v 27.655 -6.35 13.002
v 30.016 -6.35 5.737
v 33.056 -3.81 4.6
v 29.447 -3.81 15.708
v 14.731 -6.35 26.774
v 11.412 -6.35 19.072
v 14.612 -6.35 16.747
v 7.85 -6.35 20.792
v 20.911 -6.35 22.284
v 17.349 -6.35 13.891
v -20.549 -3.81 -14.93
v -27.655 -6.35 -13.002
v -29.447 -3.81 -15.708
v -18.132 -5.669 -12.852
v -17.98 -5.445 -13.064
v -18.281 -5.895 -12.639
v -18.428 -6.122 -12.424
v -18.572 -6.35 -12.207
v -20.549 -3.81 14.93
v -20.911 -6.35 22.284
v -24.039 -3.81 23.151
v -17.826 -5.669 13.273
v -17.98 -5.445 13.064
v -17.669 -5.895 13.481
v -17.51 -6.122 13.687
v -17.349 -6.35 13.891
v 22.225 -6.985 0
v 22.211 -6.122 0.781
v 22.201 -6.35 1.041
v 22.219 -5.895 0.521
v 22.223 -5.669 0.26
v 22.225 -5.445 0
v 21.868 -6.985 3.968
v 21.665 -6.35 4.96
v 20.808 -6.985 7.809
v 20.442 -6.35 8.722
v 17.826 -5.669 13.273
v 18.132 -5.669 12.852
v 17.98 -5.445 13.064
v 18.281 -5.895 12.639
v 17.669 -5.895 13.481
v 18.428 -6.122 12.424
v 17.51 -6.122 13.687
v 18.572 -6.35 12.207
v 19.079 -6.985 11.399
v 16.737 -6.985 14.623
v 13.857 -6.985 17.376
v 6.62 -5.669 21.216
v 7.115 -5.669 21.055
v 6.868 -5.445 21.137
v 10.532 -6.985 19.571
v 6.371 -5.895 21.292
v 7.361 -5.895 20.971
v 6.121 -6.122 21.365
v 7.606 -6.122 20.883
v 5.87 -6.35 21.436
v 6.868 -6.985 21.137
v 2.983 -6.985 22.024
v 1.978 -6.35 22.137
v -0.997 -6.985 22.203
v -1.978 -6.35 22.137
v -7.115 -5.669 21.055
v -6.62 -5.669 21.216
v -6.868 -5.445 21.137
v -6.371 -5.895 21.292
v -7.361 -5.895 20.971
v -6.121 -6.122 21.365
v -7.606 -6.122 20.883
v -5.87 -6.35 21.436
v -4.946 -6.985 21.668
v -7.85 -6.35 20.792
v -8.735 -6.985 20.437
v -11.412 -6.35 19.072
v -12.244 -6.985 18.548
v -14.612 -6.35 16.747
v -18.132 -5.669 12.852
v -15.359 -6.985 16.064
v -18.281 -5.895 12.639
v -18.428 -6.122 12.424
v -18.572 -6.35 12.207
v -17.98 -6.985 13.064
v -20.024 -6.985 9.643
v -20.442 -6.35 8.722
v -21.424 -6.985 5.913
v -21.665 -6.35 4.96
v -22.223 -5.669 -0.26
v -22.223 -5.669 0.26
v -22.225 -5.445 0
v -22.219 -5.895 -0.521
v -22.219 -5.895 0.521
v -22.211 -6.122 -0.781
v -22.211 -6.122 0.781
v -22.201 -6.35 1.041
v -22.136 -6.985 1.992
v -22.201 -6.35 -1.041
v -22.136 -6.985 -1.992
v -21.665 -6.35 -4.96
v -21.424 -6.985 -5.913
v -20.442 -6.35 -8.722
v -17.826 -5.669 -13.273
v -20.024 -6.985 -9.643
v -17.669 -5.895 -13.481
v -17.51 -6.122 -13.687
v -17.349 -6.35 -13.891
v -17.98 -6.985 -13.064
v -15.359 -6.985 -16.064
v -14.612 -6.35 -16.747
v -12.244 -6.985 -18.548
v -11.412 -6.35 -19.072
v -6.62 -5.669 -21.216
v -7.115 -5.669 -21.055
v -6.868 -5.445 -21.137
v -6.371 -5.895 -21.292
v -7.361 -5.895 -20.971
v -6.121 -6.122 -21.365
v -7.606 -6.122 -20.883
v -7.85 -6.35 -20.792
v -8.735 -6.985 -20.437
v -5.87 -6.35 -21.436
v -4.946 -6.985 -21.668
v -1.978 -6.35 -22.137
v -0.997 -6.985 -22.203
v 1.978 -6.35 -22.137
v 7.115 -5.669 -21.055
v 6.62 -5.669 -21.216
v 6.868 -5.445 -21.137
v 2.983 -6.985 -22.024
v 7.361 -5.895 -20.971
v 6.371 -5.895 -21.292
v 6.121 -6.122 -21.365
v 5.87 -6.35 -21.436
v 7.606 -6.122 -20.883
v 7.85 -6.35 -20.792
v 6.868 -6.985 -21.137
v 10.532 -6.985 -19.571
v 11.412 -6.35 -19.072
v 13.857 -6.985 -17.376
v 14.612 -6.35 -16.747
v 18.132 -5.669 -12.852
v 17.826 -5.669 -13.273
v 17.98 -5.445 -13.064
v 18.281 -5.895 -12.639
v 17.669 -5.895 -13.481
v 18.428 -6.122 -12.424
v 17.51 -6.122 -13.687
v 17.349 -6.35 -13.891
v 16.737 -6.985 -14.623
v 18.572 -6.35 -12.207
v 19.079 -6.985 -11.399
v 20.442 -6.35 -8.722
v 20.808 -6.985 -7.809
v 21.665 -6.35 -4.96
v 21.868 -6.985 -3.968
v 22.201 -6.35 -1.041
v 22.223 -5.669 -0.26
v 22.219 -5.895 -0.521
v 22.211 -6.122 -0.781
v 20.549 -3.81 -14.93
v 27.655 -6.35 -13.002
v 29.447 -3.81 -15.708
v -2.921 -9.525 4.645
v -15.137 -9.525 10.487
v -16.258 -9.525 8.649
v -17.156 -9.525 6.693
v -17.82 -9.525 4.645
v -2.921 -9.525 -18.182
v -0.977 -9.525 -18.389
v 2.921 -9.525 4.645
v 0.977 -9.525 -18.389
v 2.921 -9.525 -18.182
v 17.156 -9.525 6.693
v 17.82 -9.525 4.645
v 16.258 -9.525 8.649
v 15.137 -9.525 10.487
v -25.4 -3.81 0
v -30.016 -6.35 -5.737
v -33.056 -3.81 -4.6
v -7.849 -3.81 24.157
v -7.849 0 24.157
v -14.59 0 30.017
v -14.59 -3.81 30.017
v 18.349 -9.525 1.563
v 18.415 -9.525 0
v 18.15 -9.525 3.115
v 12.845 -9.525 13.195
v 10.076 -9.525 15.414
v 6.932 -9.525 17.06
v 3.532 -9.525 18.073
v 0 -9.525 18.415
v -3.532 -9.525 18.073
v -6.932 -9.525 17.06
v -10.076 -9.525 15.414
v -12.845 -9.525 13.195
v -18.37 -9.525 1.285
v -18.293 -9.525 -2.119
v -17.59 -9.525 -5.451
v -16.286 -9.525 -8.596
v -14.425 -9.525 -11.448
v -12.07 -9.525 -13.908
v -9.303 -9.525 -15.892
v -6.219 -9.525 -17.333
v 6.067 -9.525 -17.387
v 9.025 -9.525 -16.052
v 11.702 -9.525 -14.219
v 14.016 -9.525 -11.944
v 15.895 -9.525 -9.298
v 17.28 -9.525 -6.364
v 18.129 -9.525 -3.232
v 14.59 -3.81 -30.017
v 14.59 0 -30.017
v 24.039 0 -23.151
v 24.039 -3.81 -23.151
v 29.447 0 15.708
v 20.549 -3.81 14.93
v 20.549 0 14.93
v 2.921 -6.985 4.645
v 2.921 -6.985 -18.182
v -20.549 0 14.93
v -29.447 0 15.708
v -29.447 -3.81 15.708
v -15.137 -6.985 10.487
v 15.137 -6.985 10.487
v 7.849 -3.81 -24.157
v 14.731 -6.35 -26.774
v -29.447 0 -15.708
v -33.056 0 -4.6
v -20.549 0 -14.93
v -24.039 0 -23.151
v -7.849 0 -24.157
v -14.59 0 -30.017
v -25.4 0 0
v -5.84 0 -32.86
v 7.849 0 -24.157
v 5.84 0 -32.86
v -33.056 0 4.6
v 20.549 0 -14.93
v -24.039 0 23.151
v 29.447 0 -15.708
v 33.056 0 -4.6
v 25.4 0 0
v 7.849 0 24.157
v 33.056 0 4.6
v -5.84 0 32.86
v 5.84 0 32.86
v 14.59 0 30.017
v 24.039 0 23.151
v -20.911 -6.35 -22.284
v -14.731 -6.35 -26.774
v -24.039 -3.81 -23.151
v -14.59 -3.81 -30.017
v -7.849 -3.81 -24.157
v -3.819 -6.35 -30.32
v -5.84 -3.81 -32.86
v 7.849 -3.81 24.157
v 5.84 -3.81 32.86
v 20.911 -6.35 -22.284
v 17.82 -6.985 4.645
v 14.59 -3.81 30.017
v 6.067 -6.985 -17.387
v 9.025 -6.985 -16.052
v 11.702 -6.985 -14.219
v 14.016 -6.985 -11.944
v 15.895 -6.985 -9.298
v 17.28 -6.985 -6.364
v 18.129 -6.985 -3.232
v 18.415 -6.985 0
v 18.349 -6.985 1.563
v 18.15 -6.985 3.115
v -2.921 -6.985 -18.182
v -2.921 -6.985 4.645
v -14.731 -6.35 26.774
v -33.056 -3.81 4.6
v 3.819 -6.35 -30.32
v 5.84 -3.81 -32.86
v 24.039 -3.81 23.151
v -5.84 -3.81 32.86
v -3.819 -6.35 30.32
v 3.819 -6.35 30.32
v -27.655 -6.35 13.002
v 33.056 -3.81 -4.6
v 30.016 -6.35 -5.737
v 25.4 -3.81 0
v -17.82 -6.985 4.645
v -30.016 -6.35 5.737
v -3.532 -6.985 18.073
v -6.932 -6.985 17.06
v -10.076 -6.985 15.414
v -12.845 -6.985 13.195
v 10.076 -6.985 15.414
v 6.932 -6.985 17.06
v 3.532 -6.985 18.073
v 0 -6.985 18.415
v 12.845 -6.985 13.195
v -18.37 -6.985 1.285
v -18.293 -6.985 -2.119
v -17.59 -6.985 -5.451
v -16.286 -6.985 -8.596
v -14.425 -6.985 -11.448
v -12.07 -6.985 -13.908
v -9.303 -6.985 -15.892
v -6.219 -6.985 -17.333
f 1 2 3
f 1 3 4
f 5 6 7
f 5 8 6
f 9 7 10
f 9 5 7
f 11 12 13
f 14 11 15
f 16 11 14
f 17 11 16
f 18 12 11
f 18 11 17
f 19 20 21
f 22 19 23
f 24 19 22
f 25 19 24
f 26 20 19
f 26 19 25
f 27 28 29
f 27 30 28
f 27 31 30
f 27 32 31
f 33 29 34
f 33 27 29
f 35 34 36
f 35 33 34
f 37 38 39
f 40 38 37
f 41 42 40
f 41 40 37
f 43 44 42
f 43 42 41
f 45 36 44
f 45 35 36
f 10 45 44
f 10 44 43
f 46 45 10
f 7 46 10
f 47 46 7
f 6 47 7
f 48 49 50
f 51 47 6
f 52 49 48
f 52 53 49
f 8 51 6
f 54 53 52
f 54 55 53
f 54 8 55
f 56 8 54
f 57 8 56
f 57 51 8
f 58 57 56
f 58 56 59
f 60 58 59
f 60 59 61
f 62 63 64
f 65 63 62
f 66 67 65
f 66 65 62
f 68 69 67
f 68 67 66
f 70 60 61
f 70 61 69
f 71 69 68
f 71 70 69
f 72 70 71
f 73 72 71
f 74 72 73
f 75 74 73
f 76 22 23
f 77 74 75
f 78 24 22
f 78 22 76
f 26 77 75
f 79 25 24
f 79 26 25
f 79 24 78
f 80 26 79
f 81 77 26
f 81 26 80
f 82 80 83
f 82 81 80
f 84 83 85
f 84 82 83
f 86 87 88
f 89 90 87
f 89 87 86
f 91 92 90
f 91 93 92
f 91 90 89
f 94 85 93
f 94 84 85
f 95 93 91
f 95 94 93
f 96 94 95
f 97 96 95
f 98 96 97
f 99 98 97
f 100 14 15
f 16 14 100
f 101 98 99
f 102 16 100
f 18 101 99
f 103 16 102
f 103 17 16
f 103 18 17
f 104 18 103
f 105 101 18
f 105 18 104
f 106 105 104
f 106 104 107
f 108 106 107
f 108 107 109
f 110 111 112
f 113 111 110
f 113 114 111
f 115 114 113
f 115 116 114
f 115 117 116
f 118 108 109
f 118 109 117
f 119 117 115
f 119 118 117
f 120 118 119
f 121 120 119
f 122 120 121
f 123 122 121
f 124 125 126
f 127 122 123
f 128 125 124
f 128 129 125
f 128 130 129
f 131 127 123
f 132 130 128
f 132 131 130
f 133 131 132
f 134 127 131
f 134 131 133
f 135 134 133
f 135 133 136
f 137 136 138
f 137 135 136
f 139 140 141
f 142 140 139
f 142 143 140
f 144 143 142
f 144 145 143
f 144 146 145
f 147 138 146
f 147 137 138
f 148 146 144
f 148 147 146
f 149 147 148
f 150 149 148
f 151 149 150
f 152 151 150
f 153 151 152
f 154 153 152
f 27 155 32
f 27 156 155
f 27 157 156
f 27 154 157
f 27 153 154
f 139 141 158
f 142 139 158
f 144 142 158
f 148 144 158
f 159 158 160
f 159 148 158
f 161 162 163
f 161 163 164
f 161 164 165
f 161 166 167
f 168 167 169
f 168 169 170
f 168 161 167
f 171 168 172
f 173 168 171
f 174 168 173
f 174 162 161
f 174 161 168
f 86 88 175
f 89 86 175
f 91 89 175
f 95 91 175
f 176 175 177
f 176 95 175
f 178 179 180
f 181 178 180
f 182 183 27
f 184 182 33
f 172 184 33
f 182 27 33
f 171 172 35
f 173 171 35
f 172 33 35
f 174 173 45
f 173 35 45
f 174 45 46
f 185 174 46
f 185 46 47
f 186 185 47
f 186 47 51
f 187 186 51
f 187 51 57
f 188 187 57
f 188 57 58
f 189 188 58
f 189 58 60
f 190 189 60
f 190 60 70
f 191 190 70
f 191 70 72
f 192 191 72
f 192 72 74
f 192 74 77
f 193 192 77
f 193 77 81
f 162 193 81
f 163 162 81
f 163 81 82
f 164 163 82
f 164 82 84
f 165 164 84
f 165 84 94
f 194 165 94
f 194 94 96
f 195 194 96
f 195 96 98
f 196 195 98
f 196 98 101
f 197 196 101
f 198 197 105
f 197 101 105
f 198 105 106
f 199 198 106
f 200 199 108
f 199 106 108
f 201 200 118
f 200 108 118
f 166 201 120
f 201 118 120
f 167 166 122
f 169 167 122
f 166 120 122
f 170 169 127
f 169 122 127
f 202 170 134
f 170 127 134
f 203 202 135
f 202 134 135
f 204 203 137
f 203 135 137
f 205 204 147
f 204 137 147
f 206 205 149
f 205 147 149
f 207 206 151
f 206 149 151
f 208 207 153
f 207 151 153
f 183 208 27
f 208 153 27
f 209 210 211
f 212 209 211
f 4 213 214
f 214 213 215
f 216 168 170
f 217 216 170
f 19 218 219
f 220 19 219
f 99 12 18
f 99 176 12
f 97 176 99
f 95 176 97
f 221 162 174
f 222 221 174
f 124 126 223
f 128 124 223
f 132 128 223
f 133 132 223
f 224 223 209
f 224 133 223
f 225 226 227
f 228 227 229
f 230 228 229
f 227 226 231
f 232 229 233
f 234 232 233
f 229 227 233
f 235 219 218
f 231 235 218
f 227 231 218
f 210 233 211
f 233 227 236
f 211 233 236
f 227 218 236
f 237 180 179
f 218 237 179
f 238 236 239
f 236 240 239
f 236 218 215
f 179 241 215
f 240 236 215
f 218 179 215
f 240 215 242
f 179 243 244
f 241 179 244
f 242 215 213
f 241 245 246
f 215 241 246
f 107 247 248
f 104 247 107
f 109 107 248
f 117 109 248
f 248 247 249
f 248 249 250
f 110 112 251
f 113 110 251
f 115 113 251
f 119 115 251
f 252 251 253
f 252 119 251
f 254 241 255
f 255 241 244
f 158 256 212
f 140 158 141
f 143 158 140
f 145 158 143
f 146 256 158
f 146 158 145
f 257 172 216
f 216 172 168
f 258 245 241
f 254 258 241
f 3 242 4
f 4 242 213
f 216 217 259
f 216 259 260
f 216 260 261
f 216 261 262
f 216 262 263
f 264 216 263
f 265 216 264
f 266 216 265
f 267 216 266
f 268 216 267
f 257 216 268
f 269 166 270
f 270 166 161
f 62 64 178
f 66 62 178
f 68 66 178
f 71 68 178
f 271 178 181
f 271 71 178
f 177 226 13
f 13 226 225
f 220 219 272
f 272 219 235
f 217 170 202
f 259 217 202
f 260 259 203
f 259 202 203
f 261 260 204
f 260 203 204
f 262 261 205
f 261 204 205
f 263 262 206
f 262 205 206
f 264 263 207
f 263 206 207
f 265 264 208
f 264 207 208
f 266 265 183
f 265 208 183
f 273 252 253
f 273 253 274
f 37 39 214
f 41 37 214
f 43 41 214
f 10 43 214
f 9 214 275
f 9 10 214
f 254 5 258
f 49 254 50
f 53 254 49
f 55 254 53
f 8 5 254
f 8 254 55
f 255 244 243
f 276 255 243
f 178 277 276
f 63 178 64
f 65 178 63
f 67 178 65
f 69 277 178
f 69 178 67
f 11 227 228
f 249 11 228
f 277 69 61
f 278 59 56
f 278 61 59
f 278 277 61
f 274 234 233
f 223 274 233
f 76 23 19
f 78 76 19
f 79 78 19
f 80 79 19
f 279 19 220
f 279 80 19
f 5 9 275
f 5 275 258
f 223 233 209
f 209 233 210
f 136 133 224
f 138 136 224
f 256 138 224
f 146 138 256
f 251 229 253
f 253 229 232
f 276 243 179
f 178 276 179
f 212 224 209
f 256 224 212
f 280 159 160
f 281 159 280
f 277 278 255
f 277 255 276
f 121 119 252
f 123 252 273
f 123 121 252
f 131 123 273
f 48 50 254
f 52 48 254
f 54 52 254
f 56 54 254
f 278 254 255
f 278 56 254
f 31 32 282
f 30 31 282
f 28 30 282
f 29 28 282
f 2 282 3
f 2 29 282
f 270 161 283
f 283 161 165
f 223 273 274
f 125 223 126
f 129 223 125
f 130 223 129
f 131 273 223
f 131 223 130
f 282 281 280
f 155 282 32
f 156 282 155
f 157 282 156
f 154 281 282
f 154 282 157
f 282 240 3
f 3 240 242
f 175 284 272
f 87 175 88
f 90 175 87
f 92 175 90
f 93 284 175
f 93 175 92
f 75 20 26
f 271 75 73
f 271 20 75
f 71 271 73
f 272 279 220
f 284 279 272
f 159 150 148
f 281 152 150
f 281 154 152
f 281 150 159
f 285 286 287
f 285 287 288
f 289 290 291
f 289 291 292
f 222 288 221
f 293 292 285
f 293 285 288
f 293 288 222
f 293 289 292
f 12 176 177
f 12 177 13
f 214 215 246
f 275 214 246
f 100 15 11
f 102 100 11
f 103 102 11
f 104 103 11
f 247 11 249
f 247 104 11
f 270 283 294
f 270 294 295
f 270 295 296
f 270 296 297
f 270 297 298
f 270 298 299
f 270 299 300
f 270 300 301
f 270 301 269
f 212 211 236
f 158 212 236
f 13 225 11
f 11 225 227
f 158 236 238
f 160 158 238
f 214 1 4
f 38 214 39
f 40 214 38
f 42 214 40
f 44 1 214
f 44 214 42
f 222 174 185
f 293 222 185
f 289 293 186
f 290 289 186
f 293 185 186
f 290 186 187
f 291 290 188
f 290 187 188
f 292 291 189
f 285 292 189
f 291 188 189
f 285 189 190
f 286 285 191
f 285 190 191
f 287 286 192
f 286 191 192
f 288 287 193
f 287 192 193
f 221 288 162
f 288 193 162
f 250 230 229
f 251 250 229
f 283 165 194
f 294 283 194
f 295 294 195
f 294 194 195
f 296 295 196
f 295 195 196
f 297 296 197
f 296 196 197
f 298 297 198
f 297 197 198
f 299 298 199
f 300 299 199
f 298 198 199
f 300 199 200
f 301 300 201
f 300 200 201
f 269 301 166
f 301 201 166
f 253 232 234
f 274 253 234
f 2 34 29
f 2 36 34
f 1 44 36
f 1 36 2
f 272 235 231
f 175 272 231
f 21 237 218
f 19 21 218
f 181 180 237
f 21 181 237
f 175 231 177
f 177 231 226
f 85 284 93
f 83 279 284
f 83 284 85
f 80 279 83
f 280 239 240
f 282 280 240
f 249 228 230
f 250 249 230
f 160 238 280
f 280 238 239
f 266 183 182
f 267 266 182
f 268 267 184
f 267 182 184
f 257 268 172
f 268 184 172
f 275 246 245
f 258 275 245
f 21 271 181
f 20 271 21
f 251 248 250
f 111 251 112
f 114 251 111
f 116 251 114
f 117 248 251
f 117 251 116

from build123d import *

# Parameters (mm, degrees)
F1_DEPTH = 6.35
F2_SIZE  = 2.54
F3_R     = 22.225
F4_DEPTH = 3.175
F5_SIZE2 = 2.54
F5_SIZE  = 3.81
F7_DEPTH = 2.54


with BuildPart() as f1:
    # F0 (on Front) → F1 (new body)
    with BuildSketch(Plane.XZ):
        with BuildLine():
            ThreePointArc((20.5490316571, -14.9297454082), (24.1568355139, -7.8490316571), (25.4, 0))
            ThreePointArc((25.4, 0), (24.1568355139, 7.8490316571), (20.5490316571, 14.9297454082))
            ThreePointArc((20.5490316571, 14.9297454082), (14.9297454082, 20.5490316571), (7.8490316571, 24.1568355139))
            ThreePointArc((7.8490316571, 24.1568355139), (0, 25.4), (-7.8490316571, 24.1568355139))
            ThreePointArc((-7.8490316571, 24.1568355139), (-14.9297454082, 20.5490316571), (-20.5490316571, 14.9297454082))
            ThreePointArc((-20.5490316571, 14.9297454082), (-24.1568355139, 7.8490316571), (-25.4, 0))
            ThreePointArc((-25.4, 0), (-24.1568355139, -7.8490316571), (-20.5490316571, -14.9297454082))
            ThreePointArc((-20.5490316571, -14.9297454082), (-14.9297454082, -20.5490316571), (-7.8490316571, -24.1568355139))
            ThreePointArc((-7.8490316571, -24.1568355139), (0, -25.4), (7.8490316571, -24.1568355139))
            ThreePointArc((7.8490316571, -24.1568355139), (14.9297454082, -20.5490316571), (20.5490316571, -14.9297454082))
        make_face()
        with BuildLine():
            Line((33.055969229, -4.6001704102), (25.4, 0))
            ThreePointArc((25.4, 0), (24.1568355139, -7.8490316571), (20.5490316571, -14.9297454082))
            Line((20.5490316571, -14.9297454082), (29.4467531969, -15.7081951742))
            Line((29.4467531969, -15.7081951742), (33.055969229, -4.6001704102))
        make_face()
        with BuildLine():
            ThreePointArc((20.5490316571, 14.9297454082), (24.1568355139, 7.8490316571), (25.4, 0))
            Line((25.4, 0), (33.055969229, 4.6001704102))
            Line((33.055969229, 4.6001704102), (29.4467531969, 15.7081951742))
            Line((29.4467531969, 15.7081951742), (20.5490316571, 14.9297454082))
        make_face()
        with BuildLine():
            ThreePointArc((7.8490316571, 24.1568355139), (14.9297454082, 20.5490316571), (20.5490316571, 14.9297454082))
            Line((20.5490316571, 14.9297454082), (24.0389285466, 23.1514272519))
            Line((24.0389285466, 23.1514272519), (14.589878302, 30.0165641039))
            Line((14.589878302, 30.0165641039), (7.8490316571, 24.1568355139))
        make_face()
        with BuildLine():
            Line((24.0389285466, -23.1514272519), (20.5490316571, -14.9297454082))
            ThreePointArc((20.5490316571, -14.9297454082), (14.9297454082, -20.5490316571), (7.8490316571, -24.1568355139))
            Line((7.8490316571, -24.1568355139), (14.589878302, -30.0165641039))
            Line((14.589878302, -30.0165641039), (24.0389285466, -23.1514272519))
        make_face()
        with BuildLine():
            ThreePointArc((-7.8490316571, 24.1568355139), (0, 25.4), (7.8490316571, 24.1568355139))
            Line((7.8490316571, 24.1568355139), (5.8398342126, 32.8596257714))
            Line((5.8398342126, 32.8596257714), (-5.8398342126, 32.8596257714))
            Line((-5.8398342126, 32.8596257714), (-7.8490316571, 24.1568355139))
        make_face()
        with BuildLine():
            Line((5.8398342126, -32.8596257714), (7.8490316571, -24.1568355139))
            ThreePointArc((7.8490316571, -24.1568355139), (0, -25.4), (-7.8490316571, -24.1568355139))
            Line((-7.8490316571, -24.1568355139), (-5.8398342126, -32.8596257714))
            Line((-5.8398342126, -32.8596257714), (5.8398342126, -32.8596257714))
        make_face()
        with BuildLine():
            ThreePointArc((-20.5490316571, 14.9297454082), (-14.9297454082, 20.5490316571), (-7.8490316571, 24.1568355139))
            Line((-7.8490316571, 24.1568355139), (-14.589878302, 30.0165641039))
            Line((-14.589878302, 30.0165641039), (-24.0389285466, 23.1514272519))
            Line((-24.0389285466, 23.1514272519), (-20.5490316571, 14.9297454082))
        make_face()
        with BuildLine():
            Line((-14.589878302, -30.0165641039), (-7.8490316571, -24.1568355139))
            ThreePointArc((-7.8490316571, -24.1568355139), (-14.9297454082, -20.5490316571), (-20.5490316571, -14.9297454082))
            Line((-20.5490316571, -14.9297454082), (-24.0389285466, -23.1514272519))
            Line((-24.0389285466, -23.1514272519), (-14.589878302, -30.0165641039))
        make_face()
        with BuildLine():
            ThreePointArc((-25.4, 0), (-24.1568355139, 7.8490316571), (-20.5490316571, 14.9297454082))
            Line((-20.5490316571, 14.9297454082), (-29.4467531969, 15.7081951742))
            Line((-29.4467531969, 15.7081951742), (-33.055969229, 4.6001704102))
            Line((-33.055969229, 4.6001704102), (-25.4, 0))
        make_face()
        with BuildLine():
            Line((-29.4467531969, -15.7081951742), (-20.5490316571, -14.9297454082))
            ThreePointArc((-20.5490316571, -14.9297454082), (-24.1568355139, -7.8490316571), (-25.4, 0))
            Line((-25.4, 0), (-33.055969229, -4.6001704102))
            Line((-33.055969229, -4.6001704102), (-29.4467531969, -15.7081951742))
        make_face()
    extrude(amount=F1_DEPTH)

    # F2
    f2_edges = [f1.edges().sort_by_distance(p)[0] for p in [
        (-22.29398, -6.35, -19.040586),
        (-19.314403, -6.35, -26.583996),
        (-11.219455, -6.35, -27.0867),
        (-6.844433, -6.35, -28.508231),
        (0, -6.35, -32.859626),
        (6.844433, -6.35, -28.508231),
        (11.219455, -6.35, -27.0867),
        (19.314403, -6.35, -26.583996),
        (22.29398, -6.35, -19.040586),
        (24.997892, -6.35, -15.31897),
        (31.251361, -6.35, -10.154183),
        (29.227985, -6.35, -2.300085),
        (29.227985, -6.35, 2.300085),
        (31.251361, -6.35, 10.154183),
        (24.997892, -6.35, 15.31897),
        (22.29398, -6.35, 19.040586),
        (19.314403, -6.35, 26.583996),
        (11.219455, -6.35, 27.0867),
        (6.844433, -6.35, 28.508231),
        (0, -6.35, 32.859626),
        (-6.844433, -6.35, 28.508231),
        (-11.219455, -6.35, 27.0867),
        (-19.314403, -6.35, 26.583996),
        (-22.29398, -6.35, 19.040586),
        (-24.997892, -6.35, 15.31897),
        (-31.251361, -6.35, 10.154183),
        (-29.227985, -6.35, 2.300085),
        (-29.227985, -6.35, -2.300085),
        (-31.251361, -6.35, -10.154183),
        (-24.997892, -6.35, -15.31897),
    ]]
    chamfer(f2_edges, length=F2_SIZE)

    # F3 (on face) → F4 (join, symmetric)
    with BuildSketch(Plane.XZ.offset(6.35)):
        Circle(F3_R)
    extrude(amount=F4_DEPTH, both=True)

    # F5
    f5_edges = [f1.edges().sort_by_distance(p)[0] for p in [
        (-22.225, -9.525, 0),
    ]]
    f5_side = f1.faces().sort_by_distance((0, -9.525, 0))[0]
    chamfer(f5_edges, length=F5_SIZE, length2=F5_SIZE2, reference=f5_side)

    # F6 (on face) → F7 (cut)
    with BuildSketch(Plane.XZ.offset(9.525)):
        with BuildLine():
            Line((-2.921, 4.6450305921), (-17.8195374743, 4.6450305921))
            ThreePointArc((-17.8195374743, 4.6450305921), (-15.4210632515, -10.0649407943), (-2.921, -18.1818586509))
            Line((-2.921, -18.1818586509), (-2.921, 4.6450305921))
        make_face()
        with BuildLine():
            ThreePointArc((15.1371864744, 10.4870305921), (0, 18.415), (-15.1371864744, 10.4870305921))
            Line((-15.1371864744, 10.4870305921), (15.1371864744, 10.4870305921))
        make_face()
        with BuildLine():
            Line((2.921, 4.6450305921), (2.921, -18.1818586509))
            ThreePointArc((2.921, -18.1818586509), (14.0161057359, -11.9440782399), (18.415, 0))
            ThreePointArc((18.415, 0), (18.2655277448, 2.3415211306), (17.8195374743, 4.6450305921))
            Line((17.8195374743, 4.6450305921), (2.921, 4.6450305921))
        make_face()
    extrude(amount=-F7_DEPTH, mode=Mode.SUBTRACT)


solid = f1.part
